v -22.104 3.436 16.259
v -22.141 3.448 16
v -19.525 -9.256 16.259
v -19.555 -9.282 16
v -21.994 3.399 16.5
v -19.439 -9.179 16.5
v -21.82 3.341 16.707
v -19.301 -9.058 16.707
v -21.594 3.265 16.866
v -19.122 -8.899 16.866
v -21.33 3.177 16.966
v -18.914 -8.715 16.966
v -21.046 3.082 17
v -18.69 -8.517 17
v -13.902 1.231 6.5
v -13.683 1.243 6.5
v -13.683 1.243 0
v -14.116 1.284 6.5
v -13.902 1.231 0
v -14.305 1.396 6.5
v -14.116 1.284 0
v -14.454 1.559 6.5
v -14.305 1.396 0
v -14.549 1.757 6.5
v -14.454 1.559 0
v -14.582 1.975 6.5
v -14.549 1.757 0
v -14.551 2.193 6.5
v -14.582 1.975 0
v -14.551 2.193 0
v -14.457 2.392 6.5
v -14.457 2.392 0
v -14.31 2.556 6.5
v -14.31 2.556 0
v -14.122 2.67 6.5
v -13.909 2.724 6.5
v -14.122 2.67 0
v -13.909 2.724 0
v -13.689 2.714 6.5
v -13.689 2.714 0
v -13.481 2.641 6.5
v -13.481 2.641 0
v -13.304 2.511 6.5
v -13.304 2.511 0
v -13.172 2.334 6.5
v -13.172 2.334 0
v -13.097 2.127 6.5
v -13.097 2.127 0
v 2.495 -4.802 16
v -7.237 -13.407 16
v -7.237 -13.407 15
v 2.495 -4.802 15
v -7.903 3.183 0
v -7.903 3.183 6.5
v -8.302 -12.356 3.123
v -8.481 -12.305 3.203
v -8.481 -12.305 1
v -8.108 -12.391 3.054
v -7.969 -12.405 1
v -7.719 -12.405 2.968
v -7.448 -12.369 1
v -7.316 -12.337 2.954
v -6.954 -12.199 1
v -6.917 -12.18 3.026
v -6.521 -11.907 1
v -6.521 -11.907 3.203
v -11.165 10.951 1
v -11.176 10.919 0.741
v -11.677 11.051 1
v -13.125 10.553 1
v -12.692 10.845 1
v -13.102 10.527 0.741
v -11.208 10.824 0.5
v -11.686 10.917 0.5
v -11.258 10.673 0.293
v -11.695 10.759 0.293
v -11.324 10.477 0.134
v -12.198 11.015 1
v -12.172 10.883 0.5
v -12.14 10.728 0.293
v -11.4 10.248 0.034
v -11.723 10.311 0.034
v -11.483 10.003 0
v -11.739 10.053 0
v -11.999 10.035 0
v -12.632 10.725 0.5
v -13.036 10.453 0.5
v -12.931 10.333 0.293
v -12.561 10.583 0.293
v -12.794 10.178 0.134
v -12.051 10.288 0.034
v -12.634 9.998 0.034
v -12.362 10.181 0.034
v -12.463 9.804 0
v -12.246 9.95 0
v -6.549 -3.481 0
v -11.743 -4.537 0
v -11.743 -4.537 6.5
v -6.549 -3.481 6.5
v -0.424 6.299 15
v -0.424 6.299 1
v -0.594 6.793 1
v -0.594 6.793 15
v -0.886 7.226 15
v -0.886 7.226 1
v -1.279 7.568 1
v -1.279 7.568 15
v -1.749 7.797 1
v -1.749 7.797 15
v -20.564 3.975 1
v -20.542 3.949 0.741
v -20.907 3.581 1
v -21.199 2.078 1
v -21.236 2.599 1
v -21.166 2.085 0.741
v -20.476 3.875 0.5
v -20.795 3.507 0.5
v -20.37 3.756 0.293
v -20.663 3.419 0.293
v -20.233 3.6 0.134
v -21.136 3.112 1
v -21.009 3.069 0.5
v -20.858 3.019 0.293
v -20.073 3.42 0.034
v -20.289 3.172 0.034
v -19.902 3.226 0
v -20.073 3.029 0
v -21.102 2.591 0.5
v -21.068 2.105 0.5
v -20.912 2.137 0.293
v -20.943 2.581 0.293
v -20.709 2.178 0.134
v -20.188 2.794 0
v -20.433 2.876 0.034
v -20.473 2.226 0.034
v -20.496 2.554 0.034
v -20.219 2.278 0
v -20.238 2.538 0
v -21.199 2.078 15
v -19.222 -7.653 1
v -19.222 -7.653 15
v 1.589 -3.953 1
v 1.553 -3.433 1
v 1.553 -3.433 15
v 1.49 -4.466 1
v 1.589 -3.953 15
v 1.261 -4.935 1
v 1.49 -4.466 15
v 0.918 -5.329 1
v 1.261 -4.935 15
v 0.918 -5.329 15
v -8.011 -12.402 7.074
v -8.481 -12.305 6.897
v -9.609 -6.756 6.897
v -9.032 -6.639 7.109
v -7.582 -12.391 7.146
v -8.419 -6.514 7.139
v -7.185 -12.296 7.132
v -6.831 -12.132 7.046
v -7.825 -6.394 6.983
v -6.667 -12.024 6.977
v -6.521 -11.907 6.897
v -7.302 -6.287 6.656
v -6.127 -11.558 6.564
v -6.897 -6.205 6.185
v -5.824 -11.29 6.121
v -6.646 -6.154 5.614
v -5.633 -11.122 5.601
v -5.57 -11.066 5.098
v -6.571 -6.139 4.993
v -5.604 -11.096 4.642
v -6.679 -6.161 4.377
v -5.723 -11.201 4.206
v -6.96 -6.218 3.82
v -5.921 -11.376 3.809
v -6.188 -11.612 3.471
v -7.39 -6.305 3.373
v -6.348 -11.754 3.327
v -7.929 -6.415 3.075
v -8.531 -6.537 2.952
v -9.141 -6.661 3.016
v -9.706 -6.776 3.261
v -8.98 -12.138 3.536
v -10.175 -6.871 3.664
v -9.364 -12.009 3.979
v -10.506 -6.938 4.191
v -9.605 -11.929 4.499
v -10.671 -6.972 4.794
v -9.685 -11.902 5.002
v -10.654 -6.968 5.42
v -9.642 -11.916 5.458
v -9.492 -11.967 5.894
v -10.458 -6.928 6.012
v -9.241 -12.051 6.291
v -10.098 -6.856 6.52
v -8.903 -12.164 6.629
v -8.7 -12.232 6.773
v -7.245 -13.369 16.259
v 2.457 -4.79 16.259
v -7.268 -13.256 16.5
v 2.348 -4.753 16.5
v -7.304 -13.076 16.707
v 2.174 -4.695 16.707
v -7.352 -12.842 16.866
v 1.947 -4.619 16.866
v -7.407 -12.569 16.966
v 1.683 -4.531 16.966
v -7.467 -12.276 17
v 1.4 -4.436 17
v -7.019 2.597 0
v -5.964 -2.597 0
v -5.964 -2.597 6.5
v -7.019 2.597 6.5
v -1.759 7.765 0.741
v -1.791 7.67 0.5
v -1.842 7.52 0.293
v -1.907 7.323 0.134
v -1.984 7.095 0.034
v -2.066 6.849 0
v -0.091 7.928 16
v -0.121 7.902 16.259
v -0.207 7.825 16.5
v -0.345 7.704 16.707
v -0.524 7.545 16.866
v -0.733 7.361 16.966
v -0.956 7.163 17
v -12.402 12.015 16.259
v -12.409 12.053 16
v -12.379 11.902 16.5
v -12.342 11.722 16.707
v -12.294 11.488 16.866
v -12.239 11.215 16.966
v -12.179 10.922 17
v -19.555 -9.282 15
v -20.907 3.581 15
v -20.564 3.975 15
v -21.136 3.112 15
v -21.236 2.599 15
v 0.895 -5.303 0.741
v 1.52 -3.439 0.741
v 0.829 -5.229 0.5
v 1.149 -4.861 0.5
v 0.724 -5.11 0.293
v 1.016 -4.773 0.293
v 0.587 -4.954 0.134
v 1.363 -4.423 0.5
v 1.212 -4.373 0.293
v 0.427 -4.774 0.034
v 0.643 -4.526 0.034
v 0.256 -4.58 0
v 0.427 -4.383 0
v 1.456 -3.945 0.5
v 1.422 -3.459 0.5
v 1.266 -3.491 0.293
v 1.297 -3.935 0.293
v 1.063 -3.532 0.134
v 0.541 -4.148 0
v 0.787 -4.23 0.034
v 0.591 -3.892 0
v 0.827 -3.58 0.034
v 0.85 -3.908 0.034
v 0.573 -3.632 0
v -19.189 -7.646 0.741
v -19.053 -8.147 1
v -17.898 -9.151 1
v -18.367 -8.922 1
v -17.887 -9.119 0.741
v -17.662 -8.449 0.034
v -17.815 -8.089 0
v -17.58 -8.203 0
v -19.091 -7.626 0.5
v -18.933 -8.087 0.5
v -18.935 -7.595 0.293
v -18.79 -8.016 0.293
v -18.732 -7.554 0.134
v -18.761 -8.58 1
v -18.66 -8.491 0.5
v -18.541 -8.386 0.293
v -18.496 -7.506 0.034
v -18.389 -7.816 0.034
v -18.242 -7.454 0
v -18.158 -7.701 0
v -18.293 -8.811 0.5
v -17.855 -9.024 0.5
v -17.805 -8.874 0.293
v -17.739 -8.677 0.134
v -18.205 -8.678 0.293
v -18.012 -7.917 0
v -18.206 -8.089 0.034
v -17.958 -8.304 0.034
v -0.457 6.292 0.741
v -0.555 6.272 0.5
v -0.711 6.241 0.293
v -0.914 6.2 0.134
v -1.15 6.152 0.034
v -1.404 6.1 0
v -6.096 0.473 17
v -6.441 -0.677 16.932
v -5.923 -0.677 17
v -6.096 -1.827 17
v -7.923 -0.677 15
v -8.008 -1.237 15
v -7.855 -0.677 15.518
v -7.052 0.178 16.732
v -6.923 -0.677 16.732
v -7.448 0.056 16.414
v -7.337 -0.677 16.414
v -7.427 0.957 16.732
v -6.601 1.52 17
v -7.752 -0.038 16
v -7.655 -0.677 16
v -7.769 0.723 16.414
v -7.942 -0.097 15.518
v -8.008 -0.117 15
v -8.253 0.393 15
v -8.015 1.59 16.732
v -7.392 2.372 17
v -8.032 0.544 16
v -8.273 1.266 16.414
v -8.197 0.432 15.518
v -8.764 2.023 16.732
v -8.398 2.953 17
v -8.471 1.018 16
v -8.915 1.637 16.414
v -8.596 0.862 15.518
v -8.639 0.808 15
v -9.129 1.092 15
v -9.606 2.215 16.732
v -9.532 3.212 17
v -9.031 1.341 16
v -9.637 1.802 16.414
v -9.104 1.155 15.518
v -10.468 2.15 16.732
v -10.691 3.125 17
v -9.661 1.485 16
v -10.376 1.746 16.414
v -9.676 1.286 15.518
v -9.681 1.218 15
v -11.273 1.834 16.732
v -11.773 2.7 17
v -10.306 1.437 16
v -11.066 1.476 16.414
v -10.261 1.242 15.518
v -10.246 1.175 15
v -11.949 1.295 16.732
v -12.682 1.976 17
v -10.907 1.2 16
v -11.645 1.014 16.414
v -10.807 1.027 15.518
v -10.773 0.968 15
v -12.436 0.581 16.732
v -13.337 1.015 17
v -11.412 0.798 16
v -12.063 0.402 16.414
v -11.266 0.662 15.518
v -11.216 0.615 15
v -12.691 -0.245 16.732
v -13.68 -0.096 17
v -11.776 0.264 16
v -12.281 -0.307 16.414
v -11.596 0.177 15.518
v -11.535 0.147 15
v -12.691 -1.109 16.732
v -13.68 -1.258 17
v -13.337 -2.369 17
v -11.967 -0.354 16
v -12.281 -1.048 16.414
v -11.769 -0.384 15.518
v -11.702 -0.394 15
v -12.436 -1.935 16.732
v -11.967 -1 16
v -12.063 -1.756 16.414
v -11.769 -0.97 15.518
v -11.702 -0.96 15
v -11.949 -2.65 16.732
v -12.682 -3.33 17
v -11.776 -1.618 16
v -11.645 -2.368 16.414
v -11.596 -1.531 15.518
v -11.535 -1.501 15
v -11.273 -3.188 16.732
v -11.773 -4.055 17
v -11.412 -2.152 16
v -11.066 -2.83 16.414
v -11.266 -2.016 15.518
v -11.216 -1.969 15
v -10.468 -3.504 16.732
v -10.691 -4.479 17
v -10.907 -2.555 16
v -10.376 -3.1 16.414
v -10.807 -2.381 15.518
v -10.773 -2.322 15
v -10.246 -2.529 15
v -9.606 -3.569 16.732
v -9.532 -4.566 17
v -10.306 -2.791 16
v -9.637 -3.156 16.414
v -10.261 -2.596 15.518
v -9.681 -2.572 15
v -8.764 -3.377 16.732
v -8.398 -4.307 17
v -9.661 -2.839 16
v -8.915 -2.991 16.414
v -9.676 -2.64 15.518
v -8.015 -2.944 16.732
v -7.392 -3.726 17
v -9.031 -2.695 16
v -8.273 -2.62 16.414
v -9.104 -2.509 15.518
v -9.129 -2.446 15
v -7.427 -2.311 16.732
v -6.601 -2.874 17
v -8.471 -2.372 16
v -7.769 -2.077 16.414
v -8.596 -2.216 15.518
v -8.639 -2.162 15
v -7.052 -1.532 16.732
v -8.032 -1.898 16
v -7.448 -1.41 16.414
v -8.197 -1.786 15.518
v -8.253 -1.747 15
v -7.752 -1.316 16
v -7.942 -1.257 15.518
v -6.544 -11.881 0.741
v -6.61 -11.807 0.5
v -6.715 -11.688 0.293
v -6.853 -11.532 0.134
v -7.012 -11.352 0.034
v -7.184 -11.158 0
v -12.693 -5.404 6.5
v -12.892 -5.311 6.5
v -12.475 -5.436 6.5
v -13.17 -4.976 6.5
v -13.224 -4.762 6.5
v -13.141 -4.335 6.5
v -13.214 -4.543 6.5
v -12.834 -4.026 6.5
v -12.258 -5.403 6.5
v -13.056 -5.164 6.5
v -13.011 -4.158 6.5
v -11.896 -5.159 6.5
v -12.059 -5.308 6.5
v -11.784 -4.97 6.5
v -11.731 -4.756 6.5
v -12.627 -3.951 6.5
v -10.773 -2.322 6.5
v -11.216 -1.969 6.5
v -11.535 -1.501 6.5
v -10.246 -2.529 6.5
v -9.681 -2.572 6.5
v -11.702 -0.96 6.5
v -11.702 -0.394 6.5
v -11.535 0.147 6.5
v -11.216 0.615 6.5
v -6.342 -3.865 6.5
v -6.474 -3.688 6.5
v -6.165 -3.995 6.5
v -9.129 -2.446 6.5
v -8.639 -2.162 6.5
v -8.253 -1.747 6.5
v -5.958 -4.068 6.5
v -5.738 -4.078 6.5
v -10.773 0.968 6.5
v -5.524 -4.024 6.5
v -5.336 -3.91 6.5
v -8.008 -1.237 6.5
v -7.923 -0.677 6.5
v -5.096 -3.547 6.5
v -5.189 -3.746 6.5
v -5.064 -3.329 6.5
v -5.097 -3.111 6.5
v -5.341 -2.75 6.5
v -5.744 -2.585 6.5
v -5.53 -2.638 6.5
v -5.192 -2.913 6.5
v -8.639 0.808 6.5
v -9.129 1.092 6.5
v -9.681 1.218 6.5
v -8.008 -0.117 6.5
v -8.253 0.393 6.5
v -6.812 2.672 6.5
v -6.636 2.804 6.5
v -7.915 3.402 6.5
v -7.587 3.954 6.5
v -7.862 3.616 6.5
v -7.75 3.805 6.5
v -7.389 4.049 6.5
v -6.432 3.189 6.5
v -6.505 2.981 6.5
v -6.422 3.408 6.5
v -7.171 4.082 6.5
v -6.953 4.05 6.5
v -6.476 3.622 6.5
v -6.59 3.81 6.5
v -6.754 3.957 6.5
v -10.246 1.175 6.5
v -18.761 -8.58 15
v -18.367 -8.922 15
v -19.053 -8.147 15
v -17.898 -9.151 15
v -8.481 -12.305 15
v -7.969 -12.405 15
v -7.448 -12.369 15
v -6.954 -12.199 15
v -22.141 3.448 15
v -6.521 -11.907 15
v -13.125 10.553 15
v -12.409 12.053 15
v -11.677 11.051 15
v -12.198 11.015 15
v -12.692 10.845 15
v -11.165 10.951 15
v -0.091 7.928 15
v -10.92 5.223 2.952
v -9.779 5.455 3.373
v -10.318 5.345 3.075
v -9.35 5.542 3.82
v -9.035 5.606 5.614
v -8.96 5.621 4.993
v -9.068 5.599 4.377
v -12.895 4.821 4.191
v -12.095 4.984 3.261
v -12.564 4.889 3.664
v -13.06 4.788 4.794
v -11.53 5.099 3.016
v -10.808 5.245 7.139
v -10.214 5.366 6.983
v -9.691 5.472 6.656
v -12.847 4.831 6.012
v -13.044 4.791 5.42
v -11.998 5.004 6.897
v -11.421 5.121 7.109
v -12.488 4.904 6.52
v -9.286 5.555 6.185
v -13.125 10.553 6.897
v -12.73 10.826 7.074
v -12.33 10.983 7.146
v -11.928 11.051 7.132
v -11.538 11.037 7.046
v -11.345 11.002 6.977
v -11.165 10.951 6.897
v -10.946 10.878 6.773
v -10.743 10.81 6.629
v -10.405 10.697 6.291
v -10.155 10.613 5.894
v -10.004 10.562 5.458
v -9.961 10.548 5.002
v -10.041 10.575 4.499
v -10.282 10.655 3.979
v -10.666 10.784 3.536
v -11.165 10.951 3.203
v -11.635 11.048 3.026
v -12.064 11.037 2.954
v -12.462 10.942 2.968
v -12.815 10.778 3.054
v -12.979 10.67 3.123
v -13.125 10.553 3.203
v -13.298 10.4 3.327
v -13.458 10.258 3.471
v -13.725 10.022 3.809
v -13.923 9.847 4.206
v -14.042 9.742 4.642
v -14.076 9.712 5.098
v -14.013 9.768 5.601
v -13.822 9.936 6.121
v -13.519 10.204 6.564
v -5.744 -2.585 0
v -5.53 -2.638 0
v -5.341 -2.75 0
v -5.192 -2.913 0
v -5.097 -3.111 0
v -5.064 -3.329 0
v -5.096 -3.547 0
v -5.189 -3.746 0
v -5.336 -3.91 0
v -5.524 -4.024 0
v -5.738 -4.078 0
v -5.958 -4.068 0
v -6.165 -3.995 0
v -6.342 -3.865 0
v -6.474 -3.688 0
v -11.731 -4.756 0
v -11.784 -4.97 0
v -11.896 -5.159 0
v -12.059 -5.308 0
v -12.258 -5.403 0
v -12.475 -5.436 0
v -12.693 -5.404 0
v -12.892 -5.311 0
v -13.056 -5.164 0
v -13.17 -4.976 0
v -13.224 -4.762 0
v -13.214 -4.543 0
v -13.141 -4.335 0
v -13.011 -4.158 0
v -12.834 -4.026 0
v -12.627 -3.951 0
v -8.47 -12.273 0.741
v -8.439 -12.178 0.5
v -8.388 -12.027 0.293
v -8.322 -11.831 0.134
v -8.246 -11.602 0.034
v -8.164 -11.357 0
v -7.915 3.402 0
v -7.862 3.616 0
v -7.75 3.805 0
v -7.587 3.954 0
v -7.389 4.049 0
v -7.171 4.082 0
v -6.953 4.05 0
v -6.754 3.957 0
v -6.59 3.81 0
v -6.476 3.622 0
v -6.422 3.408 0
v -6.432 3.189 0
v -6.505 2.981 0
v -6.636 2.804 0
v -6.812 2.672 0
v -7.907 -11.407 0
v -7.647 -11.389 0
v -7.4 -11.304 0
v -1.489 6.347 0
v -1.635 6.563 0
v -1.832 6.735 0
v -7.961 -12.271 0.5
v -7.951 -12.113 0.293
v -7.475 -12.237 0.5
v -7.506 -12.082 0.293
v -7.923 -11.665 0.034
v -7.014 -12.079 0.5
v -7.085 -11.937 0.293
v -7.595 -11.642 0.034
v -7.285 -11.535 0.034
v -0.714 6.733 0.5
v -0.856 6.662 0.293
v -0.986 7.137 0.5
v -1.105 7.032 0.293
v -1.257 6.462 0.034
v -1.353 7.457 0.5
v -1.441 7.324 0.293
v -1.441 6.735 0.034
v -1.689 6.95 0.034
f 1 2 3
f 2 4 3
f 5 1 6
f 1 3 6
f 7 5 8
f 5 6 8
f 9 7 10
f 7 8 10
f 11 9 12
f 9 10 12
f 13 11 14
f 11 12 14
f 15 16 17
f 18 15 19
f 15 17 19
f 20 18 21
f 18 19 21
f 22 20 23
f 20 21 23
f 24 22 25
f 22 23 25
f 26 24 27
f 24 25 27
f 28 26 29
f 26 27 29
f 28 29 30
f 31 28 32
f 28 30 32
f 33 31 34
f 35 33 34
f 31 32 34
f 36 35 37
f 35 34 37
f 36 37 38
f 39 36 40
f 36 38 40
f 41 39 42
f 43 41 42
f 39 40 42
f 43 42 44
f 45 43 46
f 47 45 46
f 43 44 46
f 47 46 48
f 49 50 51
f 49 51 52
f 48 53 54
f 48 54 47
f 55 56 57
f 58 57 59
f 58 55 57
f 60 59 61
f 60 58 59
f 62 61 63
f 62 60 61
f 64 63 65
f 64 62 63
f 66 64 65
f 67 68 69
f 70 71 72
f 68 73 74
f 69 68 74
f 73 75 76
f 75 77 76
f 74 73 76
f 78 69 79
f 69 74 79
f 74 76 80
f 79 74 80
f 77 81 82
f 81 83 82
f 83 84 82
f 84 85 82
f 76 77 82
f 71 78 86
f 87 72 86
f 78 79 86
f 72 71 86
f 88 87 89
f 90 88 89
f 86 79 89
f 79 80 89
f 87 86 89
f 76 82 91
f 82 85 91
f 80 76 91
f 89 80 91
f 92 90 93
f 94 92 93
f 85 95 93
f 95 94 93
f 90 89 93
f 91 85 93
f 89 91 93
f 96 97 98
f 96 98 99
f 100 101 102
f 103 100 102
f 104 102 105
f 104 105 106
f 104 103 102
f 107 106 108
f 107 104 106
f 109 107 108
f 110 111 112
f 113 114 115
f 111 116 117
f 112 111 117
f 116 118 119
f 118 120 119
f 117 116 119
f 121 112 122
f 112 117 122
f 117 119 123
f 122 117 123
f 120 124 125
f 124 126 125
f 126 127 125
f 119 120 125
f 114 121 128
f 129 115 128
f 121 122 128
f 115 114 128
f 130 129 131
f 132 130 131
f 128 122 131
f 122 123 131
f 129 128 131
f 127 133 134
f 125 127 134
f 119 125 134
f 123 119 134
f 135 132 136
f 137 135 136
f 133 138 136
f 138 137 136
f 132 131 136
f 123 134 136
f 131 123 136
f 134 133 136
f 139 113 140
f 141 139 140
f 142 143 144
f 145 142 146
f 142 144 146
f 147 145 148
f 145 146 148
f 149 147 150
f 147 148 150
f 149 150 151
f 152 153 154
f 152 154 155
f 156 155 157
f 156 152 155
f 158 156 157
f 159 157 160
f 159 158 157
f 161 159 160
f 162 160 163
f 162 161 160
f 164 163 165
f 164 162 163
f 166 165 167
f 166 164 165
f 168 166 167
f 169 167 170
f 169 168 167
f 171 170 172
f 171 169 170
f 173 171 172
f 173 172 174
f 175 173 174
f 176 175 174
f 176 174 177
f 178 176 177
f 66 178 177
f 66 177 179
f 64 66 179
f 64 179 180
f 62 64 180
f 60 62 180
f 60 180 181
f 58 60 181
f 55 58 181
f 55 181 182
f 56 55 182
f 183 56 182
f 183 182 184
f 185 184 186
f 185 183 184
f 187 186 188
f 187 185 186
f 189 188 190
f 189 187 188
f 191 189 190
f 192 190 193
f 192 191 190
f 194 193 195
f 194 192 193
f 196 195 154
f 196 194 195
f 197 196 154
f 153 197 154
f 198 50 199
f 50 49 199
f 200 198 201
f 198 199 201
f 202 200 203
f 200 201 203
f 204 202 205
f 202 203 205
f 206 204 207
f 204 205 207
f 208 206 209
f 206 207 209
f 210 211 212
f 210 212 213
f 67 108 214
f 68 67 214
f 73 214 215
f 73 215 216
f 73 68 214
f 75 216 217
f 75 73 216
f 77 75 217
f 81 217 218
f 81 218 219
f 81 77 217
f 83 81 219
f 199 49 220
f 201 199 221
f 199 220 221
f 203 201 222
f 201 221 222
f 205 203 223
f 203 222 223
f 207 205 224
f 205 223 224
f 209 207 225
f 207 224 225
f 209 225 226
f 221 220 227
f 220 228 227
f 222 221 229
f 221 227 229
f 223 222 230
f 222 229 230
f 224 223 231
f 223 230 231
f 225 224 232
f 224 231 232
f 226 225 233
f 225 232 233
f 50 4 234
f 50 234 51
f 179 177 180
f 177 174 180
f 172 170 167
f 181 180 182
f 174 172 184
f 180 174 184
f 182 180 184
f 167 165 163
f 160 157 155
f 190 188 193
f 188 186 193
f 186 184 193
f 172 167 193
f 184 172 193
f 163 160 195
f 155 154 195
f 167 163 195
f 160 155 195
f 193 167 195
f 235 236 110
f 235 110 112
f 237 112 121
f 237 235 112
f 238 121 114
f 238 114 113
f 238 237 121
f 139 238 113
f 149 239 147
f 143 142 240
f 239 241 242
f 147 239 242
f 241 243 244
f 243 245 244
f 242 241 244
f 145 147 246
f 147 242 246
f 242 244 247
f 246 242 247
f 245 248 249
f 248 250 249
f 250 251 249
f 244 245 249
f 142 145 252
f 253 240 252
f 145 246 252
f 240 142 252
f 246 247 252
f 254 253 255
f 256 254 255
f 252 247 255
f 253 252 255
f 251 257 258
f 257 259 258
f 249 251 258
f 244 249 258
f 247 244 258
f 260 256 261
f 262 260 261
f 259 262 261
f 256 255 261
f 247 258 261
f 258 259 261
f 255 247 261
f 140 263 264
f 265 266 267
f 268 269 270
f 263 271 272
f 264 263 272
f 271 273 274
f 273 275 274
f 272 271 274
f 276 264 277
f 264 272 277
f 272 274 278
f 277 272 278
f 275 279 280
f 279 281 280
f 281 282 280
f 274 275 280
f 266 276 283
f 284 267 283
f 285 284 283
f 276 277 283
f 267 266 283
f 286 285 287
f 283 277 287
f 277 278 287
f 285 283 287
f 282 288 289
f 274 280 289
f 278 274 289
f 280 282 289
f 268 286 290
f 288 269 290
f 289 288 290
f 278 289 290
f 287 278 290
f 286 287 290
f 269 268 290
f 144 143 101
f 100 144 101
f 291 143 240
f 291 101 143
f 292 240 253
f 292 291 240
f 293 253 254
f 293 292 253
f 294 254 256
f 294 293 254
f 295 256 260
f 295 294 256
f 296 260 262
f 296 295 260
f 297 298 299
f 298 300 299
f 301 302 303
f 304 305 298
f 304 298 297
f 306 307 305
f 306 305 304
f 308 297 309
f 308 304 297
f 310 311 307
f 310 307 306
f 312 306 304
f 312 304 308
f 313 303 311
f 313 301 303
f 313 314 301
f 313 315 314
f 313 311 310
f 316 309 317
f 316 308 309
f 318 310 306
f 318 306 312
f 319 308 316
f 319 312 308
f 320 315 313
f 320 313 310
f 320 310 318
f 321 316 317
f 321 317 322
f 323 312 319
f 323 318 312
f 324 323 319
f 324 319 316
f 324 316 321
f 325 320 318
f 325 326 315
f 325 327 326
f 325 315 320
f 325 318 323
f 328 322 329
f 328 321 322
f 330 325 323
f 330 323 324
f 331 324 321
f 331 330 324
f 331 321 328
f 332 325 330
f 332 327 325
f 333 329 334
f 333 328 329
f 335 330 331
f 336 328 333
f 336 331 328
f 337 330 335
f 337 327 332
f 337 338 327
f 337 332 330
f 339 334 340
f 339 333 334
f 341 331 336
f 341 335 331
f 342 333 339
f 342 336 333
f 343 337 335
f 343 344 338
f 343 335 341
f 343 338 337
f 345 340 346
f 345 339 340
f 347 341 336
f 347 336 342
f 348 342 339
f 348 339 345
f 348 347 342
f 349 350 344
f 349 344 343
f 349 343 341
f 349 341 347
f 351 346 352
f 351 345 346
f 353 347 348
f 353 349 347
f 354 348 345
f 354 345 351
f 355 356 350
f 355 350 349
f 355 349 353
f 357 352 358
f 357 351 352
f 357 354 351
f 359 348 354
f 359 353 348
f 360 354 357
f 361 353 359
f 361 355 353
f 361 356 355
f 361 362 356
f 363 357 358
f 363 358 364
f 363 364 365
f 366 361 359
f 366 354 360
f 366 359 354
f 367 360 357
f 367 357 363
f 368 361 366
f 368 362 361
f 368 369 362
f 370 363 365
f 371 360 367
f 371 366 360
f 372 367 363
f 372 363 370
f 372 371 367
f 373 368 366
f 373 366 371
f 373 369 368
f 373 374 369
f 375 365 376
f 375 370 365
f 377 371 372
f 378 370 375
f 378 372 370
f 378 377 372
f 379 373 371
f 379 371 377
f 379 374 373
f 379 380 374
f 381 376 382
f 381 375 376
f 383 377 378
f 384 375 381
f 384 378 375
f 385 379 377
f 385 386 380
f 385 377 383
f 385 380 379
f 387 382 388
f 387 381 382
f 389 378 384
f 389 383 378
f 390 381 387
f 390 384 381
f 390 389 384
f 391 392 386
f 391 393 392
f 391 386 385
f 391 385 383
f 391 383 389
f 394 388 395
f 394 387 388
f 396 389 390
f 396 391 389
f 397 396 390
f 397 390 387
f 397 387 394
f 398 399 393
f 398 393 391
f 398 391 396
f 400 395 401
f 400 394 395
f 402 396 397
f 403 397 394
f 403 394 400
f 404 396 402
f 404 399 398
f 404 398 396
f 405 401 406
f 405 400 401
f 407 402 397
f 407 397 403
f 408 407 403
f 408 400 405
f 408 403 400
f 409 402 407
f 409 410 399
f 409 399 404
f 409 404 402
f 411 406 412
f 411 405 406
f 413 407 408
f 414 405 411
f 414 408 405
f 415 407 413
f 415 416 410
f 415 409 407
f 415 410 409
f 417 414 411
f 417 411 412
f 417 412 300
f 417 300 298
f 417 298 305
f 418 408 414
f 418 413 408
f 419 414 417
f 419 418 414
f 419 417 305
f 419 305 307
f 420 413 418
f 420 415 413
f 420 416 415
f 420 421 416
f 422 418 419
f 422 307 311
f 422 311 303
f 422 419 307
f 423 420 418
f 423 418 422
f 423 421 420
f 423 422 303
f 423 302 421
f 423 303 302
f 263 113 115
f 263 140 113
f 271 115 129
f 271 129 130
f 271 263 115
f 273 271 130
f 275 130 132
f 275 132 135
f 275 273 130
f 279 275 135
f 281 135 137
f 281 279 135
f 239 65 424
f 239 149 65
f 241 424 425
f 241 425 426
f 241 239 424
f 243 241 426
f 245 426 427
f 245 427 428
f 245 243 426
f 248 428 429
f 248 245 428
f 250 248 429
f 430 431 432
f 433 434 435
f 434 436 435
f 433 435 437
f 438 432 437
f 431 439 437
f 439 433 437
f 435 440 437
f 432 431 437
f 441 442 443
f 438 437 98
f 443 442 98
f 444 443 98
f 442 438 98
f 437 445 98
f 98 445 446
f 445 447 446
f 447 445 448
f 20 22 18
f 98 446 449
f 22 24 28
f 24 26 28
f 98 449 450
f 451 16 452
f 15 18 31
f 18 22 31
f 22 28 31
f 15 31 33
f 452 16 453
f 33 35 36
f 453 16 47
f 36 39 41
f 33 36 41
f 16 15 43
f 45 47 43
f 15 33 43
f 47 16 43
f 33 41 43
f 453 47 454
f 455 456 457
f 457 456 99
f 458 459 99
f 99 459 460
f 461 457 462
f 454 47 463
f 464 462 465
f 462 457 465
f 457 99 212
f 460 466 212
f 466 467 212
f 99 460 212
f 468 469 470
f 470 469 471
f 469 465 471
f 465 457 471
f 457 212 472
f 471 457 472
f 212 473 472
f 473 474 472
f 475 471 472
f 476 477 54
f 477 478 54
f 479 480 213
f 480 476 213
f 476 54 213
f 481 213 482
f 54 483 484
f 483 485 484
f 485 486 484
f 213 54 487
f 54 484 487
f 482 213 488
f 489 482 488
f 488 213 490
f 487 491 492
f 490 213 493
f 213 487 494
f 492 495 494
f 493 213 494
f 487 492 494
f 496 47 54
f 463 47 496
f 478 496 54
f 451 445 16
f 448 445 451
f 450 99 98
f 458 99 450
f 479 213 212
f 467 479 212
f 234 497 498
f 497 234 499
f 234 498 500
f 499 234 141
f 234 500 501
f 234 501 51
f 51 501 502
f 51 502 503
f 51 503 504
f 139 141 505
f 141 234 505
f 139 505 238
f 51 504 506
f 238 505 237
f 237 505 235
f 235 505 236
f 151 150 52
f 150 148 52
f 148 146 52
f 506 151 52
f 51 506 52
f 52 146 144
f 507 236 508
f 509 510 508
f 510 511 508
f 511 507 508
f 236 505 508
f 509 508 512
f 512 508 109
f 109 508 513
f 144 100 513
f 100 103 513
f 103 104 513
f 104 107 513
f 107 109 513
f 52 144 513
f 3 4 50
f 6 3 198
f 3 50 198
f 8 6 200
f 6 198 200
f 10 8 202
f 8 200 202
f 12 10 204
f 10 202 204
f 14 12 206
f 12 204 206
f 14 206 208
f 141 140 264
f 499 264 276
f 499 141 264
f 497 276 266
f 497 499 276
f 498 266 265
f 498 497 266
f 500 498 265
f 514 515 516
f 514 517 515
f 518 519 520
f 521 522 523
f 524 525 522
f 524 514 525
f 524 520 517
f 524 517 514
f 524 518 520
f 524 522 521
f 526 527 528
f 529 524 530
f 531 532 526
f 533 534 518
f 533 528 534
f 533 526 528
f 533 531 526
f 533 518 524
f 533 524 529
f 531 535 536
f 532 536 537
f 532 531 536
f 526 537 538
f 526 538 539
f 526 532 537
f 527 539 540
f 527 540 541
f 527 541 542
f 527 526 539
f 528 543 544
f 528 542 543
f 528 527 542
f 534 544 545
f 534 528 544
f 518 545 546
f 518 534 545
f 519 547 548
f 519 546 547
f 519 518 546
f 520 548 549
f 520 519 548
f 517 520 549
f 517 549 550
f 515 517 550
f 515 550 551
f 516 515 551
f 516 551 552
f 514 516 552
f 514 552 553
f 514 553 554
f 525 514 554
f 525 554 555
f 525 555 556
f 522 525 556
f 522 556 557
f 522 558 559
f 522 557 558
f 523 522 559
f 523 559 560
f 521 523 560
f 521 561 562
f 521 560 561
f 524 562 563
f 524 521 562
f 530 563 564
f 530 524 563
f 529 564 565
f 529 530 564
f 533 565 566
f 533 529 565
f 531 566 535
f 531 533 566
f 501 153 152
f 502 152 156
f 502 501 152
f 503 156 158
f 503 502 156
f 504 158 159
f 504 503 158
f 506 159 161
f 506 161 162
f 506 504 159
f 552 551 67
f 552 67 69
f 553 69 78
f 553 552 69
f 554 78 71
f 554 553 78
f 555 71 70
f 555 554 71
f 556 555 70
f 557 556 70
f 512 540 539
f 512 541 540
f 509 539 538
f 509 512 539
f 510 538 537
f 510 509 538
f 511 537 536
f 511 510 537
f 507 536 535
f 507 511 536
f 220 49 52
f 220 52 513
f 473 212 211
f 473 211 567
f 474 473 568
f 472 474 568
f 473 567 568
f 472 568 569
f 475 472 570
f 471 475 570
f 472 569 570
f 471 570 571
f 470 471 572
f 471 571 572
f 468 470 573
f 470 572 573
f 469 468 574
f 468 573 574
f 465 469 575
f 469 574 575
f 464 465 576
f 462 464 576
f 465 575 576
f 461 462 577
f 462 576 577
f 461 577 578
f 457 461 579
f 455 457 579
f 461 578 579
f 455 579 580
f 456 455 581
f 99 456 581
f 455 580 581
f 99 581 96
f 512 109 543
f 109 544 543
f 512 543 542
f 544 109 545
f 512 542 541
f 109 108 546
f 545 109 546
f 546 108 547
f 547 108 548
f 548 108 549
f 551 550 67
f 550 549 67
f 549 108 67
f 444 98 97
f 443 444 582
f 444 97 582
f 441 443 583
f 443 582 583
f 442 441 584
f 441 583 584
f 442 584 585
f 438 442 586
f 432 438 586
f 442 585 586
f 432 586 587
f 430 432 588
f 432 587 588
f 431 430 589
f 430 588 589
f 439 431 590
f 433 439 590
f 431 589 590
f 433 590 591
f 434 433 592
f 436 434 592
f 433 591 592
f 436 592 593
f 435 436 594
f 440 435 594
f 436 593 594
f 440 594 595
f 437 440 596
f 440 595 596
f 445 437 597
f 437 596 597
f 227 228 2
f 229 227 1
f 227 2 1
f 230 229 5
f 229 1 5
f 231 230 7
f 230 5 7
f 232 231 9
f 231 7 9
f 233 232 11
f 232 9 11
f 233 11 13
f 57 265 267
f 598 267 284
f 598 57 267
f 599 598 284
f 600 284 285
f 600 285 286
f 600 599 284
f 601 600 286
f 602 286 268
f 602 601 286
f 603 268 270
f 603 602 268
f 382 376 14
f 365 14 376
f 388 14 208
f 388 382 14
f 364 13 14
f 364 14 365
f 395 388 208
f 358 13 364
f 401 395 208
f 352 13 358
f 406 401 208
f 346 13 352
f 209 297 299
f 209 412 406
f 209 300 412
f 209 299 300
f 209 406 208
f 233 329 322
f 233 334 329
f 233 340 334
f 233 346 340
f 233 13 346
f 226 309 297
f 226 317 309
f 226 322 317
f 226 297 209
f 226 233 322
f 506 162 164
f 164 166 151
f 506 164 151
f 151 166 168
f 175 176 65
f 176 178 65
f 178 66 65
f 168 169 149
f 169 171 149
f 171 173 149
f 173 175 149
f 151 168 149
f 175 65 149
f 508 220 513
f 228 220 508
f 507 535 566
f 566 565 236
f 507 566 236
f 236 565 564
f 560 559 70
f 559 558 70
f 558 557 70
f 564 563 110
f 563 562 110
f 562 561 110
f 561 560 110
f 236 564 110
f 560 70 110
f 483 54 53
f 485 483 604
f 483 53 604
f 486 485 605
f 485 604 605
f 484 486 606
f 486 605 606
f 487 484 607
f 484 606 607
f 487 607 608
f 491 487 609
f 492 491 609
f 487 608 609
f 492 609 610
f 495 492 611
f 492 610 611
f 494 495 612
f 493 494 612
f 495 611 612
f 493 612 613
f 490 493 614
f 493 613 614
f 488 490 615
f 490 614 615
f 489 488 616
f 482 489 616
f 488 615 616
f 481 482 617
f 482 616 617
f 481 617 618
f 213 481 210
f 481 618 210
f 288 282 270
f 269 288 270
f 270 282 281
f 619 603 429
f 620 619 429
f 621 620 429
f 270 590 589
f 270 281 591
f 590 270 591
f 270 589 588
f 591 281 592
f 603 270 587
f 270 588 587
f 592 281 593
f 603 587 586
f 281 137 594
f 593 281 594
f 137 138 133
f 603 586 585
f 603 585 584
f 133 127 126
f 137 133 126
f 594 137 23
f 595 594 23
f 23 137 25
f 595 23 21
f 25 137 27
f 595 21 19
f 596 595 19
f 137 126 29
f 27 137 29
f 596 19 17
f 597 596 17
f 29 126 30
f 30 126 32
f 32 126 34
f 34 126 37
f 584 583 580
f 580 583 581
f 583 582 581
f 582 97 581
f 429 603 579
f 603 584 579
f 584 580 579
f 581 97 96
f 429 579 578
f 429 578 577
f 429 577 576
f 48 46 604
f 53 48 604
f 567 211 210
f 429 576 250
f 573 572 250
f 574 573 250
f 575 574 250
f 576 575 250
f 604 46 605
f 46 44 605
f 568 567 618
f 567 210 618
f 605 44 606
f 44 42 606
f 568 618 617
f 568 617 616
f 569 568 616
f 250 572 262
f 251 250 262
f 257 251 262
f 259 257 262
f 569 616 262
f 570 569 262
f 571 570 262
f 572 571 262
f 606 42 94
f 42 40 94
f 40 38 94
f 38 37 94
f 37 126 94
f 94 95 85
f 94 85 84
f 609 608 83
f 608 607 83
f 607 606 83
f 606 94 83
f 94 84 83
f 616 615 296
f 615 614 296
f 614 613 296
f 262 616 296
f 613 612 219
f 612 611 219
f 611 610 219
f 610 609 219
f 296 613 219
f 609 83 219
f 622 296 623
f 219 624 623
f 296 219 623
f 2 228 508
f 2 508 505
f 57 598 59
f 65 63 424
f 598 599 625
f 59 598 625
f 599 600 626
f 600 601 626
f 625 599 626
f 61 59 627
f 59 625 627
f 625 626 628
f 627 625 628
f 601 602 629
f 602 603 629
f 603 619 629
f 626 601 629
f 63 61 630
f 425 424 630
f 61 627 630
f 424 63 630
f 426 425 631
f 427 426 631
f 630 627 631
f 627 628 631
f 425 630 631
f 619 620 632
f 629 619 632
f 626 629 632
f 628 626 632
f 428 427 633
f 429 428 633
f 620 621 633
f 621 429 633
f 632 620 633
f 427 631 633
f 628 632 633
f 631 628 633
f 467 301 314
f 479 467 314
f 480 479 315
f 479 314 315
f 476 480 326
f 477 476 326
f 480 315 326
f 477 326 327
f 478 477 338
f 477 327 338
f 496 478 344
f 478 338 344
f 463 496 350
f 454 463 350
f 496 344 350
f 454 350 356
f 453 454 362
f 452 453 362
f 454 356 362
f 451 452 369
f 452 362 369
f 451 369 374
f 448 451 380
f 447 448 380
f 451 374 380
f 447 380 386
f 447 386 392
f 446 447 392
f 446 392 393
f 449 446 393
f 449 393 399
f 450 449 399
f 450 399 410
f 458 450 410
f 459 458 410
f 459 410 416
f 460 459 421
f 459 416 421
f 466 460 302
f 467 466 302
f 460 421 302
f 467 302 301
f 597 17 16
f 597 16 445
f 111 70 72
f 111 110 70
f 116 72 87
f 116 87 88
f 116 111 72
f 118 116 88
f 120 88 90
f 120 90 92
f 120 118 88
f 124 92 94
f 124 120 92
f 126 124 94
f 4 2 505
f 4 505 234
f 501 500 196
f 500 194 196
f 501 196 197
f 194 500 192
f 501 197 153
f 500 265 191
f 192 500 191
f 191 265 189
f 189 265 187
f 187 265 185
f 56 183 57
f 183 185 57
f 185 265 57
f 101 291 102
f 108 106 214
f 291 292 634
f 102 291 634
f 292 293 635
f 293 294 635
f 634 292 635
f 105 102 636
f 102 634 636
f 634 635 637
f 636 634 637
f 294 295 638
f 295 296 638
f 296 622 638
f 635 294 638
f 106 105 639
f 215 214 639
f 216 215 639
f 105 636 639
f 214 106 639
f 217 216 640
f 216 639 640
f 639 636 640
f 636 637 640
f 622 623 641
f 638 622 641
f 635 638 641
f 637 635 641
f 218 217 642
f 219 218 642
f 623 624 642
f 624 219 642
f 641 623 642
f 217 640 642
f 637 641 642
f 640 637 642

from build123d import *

# Parameters (mm, degrees)
DODANIE_WYCI_GNI_CIE1_DEPTH      = 17
ZAOKR_GLENIE1_R                  = 2
DODANIE_WYCI_GNI_CIE2_DEPTH      = 2
ZAOKR_GLENIE2_R                  = 1
ZAOKR_GLENIE3_R                  = 1
WYTNIJ_WYCI_GNI_CIE1_DEPTH       = 32.35628887
WYTNIJ_WYCI_GNI_CIE1_DEPTH_BACK  = 32.35628887
SZKIC4_R                         = 2.1
DODANIE_WYCI_GNI_CIE3_DEPTH      = 6
DODANIE_WYCI_GNI_CIE3_DEPTH_BACK = 6
SZKIC9_R                         = 2.1
SZKIC8_R                         = 1.9
WYTNIJ_WYCI_GNI_CIE3_DEPTH       = 10.5
ZAOKR_GLENIE5_R                  = 2
WYTNIJ_WYCI_GNI_CIE4_DEPTH       = 6.5
SZKIC12_R                        = 0.75
WYTNIJ_WYCI_GNI_CIE5_DEPTH       = 6.5


with BuildPart() as part:
    # Szkic1 → Dodanie-wyciągnięcie1 (new body)
    with BuildSketch(Plane.XY):
        Polygon((1.783068787, -4.564092652), (-0.653727134, 7.430712848), (-12.25993137, 11.317788426), (-21.429339686, 3.210058505), (-18.992543765, -8.784746995), (-7.386339528, -12.671822573), align=None)
    extrude(amount=DODANIE_WYCI_GNI_CIE1_DEPTH)

    # Zaokrąglenie1
    zaokr_glenie1_edges = [part.edges().sort_by_distance(p)[0] for p in [
        (-7.386339528, -12.671822573, 8.5),
        (-18.992543765, -8.784746995, 8.5),
        (-21.429339686, 3.210058505, 8.5),
        (-12.25993137, 11.317788426, 8.5),
        (-0.653727134, 7.430712848, 8.5),
        (1.783068787, -4.564092652, 8.5),
    ]]
    fillet(zaokr_glenie1_edges, radius=ZAOKR_GLENIE1_R)

    # Szkic3 → Dodanie-wyciągnięcie2 (add)
    with BuildSketch(Plane.XY.offset(17)):
        Polygon((-0.091452095, 7.927884965), (-12.409357535, 12.053318952), (-22.141040889, 3.448416913), (-19.554818803, -9.281919113), (-7.236913363, -13.407353099), (2.494769991, -4.80245106), align=None)
    extrude(amount=-DODANIE_WYCI_GNI_CIE2_DEPTH)

    # Zaokrąglenie2
    zaokr_glenie2_edges = [part.edges().sort_by_distance(p)[0] for p in [
        (-6.456829252, 9.374250637, 0),
        (-2.80163537, -8.617957613, 0),
        (-13.189441647, -10.728284784, 0),
        (-20.210941725, -2.787344245, 0),
        (-16.844635528, 7.263923465, 0),
        (0.564670827, 1.433310098, 0),
        (-12.198333493, 11.014581025, 0),
        (-21.135955436, 3.111800131, 0),
        (-18.760757392, -8.579797968, 0),
        (-7.447937406, -12.368615173, 0),
        (1.489684537, -4.465834278, 0),
        (-0.885513507, 7.225763821, 0),
    ]]
    fillet(zaokr_glenie2_edges, radius=ZAOKR_GLENIE2_R)

    # Zaokrąglenie3
    zaokr_glenie3_edges = [part.edges().sort_by_distance(p)[0] for p in [
        (1.201658948, 1.562716953, 17),
        (-6.250404815, 9.990601959, 17),
        (-17.275199212, 7.750867932, 17),
        (-20.847929846, -2.9167511, 17),
        (-13.395866083, -11.344636106, 17),
        (-2.371071686, -9.10490208, 17),
    ]]
    fillet(zaokr_glenie3_edges, radius=ZAOKR_GLENIE3_R)

    # Szkic4 → Wytnij-wyciągnięcie1 (cut, two sides: drawn at the far end of the back side and taken through both)
    with BuildSketch(Plane(origin=(-0.257260592, 1.266331223, 0), x_dir=(0.9799817241599056, 0.19908746899937949, 0), z_dir=(-0.19908746899937946, 0.9799817241599055, 0)).offset(-WYTNIJ_WYCI_GNI_CIE1_DEPTH_BACK)):
        with Locations(Location((-9.76127883, -5.05, 0), (0, 0, 241.563109851))):
            Circle(SZKIC4_R)
    extrude(amount=WYTNIJ_WYCI_GNI_CIE1_DEPTH + WYTNIJ_WYCI_GNI_CIE1_DEPTH_BACK, mode=Mode.SUBTRACT)

    # Szkic9 → Dodanie-wyciągnięcie3 (add, two sides: drawn at the far end of the back side and taken through both)
    with BuildSketch(Plane(origin=(-0.257260592, 1.266331223, 0), x_dir=(0.9799817241599056, 0.19908746899937949, 0), z_dir=(-0.19908746899937946, 0.9799817241599055, 0)).offset(-DODANIE_WYCI_GNI_CIE3_DEPTH_BACK)):
        with Locations(Location((-9.76127883, -5.05, 0), (0, 0, 180))):
            Circle(SZKIC9_R)
    extrude(amount=DODANIE_WYCI_GNI_CIE3_DEPTH + DODANIE_WYCI_GNI_CIE3_DEPTH_BACK)

    # Szkic8 → Wytnij-wyciągnięcie3 (cut)
    with BuildSketch(Plane.XY.offset(17)):
        with Locations((-9.823135449, -0.677017074)):
            Circle(SZKIC8_R)
    extrude(amount=-WYTNIJ_WYCI_GNI_CIE3_DEPTH, mode=Mode.SUBTRACT)

    # Zaokrąglenie5
    zaokr_glenie5_edges = [part.edges().sort_by_distance(p)[0] for p in [
        (-11.723135449, -0.677017074, 17),
    ]]
    fillet(zaokr_glenie5_edges, radius=ZAOKR_GLENIE5_R)

    # Szkic11 → Wytnij-wyciągnięcie4 (cut)
    with BuildSketch(Plane(origin=(0, 0, 0), x_dir=(-1, 0, 0), z_dir=(0, 0, -1))):
        Polygon((13.831970706, 1.978023394), (12.478175917, -4.68585233), (5.814300193, -3.332057541), (7.168094982, 3.331818183), align=None)
    extrude(amount=-WYTNIJ_WYCI_GNI_CIE4_DEPTH, mode=Mode.SUBTRACT)

    # Szkic12 → Wytnij-wyciągnięcie5 (cut)
    with BuildSketch(Plane(origin=(0, 0, 0), x_dir=(-1, 0, 0), z_dir=(0, 0, -1))):
        with Locations((13.831970706, 1.978023394)):
            Circle(SZKIC12_R)
        with Locations((12.478175917, -4.68585233)):
            Circle(SZKIC12_R)
        with Locations((5.814300193, -3.332057541)):
            Circle(SZKIC12_R)
        with Locations((7.168094982, 3.331818183)):
            Circle(SZKIC12_R)
    extrude(amount=-WYTNIJ_WYCI_GNI_CIE5_DEPTH, mode=Mode.SUBTRACT)


solid = part.part
